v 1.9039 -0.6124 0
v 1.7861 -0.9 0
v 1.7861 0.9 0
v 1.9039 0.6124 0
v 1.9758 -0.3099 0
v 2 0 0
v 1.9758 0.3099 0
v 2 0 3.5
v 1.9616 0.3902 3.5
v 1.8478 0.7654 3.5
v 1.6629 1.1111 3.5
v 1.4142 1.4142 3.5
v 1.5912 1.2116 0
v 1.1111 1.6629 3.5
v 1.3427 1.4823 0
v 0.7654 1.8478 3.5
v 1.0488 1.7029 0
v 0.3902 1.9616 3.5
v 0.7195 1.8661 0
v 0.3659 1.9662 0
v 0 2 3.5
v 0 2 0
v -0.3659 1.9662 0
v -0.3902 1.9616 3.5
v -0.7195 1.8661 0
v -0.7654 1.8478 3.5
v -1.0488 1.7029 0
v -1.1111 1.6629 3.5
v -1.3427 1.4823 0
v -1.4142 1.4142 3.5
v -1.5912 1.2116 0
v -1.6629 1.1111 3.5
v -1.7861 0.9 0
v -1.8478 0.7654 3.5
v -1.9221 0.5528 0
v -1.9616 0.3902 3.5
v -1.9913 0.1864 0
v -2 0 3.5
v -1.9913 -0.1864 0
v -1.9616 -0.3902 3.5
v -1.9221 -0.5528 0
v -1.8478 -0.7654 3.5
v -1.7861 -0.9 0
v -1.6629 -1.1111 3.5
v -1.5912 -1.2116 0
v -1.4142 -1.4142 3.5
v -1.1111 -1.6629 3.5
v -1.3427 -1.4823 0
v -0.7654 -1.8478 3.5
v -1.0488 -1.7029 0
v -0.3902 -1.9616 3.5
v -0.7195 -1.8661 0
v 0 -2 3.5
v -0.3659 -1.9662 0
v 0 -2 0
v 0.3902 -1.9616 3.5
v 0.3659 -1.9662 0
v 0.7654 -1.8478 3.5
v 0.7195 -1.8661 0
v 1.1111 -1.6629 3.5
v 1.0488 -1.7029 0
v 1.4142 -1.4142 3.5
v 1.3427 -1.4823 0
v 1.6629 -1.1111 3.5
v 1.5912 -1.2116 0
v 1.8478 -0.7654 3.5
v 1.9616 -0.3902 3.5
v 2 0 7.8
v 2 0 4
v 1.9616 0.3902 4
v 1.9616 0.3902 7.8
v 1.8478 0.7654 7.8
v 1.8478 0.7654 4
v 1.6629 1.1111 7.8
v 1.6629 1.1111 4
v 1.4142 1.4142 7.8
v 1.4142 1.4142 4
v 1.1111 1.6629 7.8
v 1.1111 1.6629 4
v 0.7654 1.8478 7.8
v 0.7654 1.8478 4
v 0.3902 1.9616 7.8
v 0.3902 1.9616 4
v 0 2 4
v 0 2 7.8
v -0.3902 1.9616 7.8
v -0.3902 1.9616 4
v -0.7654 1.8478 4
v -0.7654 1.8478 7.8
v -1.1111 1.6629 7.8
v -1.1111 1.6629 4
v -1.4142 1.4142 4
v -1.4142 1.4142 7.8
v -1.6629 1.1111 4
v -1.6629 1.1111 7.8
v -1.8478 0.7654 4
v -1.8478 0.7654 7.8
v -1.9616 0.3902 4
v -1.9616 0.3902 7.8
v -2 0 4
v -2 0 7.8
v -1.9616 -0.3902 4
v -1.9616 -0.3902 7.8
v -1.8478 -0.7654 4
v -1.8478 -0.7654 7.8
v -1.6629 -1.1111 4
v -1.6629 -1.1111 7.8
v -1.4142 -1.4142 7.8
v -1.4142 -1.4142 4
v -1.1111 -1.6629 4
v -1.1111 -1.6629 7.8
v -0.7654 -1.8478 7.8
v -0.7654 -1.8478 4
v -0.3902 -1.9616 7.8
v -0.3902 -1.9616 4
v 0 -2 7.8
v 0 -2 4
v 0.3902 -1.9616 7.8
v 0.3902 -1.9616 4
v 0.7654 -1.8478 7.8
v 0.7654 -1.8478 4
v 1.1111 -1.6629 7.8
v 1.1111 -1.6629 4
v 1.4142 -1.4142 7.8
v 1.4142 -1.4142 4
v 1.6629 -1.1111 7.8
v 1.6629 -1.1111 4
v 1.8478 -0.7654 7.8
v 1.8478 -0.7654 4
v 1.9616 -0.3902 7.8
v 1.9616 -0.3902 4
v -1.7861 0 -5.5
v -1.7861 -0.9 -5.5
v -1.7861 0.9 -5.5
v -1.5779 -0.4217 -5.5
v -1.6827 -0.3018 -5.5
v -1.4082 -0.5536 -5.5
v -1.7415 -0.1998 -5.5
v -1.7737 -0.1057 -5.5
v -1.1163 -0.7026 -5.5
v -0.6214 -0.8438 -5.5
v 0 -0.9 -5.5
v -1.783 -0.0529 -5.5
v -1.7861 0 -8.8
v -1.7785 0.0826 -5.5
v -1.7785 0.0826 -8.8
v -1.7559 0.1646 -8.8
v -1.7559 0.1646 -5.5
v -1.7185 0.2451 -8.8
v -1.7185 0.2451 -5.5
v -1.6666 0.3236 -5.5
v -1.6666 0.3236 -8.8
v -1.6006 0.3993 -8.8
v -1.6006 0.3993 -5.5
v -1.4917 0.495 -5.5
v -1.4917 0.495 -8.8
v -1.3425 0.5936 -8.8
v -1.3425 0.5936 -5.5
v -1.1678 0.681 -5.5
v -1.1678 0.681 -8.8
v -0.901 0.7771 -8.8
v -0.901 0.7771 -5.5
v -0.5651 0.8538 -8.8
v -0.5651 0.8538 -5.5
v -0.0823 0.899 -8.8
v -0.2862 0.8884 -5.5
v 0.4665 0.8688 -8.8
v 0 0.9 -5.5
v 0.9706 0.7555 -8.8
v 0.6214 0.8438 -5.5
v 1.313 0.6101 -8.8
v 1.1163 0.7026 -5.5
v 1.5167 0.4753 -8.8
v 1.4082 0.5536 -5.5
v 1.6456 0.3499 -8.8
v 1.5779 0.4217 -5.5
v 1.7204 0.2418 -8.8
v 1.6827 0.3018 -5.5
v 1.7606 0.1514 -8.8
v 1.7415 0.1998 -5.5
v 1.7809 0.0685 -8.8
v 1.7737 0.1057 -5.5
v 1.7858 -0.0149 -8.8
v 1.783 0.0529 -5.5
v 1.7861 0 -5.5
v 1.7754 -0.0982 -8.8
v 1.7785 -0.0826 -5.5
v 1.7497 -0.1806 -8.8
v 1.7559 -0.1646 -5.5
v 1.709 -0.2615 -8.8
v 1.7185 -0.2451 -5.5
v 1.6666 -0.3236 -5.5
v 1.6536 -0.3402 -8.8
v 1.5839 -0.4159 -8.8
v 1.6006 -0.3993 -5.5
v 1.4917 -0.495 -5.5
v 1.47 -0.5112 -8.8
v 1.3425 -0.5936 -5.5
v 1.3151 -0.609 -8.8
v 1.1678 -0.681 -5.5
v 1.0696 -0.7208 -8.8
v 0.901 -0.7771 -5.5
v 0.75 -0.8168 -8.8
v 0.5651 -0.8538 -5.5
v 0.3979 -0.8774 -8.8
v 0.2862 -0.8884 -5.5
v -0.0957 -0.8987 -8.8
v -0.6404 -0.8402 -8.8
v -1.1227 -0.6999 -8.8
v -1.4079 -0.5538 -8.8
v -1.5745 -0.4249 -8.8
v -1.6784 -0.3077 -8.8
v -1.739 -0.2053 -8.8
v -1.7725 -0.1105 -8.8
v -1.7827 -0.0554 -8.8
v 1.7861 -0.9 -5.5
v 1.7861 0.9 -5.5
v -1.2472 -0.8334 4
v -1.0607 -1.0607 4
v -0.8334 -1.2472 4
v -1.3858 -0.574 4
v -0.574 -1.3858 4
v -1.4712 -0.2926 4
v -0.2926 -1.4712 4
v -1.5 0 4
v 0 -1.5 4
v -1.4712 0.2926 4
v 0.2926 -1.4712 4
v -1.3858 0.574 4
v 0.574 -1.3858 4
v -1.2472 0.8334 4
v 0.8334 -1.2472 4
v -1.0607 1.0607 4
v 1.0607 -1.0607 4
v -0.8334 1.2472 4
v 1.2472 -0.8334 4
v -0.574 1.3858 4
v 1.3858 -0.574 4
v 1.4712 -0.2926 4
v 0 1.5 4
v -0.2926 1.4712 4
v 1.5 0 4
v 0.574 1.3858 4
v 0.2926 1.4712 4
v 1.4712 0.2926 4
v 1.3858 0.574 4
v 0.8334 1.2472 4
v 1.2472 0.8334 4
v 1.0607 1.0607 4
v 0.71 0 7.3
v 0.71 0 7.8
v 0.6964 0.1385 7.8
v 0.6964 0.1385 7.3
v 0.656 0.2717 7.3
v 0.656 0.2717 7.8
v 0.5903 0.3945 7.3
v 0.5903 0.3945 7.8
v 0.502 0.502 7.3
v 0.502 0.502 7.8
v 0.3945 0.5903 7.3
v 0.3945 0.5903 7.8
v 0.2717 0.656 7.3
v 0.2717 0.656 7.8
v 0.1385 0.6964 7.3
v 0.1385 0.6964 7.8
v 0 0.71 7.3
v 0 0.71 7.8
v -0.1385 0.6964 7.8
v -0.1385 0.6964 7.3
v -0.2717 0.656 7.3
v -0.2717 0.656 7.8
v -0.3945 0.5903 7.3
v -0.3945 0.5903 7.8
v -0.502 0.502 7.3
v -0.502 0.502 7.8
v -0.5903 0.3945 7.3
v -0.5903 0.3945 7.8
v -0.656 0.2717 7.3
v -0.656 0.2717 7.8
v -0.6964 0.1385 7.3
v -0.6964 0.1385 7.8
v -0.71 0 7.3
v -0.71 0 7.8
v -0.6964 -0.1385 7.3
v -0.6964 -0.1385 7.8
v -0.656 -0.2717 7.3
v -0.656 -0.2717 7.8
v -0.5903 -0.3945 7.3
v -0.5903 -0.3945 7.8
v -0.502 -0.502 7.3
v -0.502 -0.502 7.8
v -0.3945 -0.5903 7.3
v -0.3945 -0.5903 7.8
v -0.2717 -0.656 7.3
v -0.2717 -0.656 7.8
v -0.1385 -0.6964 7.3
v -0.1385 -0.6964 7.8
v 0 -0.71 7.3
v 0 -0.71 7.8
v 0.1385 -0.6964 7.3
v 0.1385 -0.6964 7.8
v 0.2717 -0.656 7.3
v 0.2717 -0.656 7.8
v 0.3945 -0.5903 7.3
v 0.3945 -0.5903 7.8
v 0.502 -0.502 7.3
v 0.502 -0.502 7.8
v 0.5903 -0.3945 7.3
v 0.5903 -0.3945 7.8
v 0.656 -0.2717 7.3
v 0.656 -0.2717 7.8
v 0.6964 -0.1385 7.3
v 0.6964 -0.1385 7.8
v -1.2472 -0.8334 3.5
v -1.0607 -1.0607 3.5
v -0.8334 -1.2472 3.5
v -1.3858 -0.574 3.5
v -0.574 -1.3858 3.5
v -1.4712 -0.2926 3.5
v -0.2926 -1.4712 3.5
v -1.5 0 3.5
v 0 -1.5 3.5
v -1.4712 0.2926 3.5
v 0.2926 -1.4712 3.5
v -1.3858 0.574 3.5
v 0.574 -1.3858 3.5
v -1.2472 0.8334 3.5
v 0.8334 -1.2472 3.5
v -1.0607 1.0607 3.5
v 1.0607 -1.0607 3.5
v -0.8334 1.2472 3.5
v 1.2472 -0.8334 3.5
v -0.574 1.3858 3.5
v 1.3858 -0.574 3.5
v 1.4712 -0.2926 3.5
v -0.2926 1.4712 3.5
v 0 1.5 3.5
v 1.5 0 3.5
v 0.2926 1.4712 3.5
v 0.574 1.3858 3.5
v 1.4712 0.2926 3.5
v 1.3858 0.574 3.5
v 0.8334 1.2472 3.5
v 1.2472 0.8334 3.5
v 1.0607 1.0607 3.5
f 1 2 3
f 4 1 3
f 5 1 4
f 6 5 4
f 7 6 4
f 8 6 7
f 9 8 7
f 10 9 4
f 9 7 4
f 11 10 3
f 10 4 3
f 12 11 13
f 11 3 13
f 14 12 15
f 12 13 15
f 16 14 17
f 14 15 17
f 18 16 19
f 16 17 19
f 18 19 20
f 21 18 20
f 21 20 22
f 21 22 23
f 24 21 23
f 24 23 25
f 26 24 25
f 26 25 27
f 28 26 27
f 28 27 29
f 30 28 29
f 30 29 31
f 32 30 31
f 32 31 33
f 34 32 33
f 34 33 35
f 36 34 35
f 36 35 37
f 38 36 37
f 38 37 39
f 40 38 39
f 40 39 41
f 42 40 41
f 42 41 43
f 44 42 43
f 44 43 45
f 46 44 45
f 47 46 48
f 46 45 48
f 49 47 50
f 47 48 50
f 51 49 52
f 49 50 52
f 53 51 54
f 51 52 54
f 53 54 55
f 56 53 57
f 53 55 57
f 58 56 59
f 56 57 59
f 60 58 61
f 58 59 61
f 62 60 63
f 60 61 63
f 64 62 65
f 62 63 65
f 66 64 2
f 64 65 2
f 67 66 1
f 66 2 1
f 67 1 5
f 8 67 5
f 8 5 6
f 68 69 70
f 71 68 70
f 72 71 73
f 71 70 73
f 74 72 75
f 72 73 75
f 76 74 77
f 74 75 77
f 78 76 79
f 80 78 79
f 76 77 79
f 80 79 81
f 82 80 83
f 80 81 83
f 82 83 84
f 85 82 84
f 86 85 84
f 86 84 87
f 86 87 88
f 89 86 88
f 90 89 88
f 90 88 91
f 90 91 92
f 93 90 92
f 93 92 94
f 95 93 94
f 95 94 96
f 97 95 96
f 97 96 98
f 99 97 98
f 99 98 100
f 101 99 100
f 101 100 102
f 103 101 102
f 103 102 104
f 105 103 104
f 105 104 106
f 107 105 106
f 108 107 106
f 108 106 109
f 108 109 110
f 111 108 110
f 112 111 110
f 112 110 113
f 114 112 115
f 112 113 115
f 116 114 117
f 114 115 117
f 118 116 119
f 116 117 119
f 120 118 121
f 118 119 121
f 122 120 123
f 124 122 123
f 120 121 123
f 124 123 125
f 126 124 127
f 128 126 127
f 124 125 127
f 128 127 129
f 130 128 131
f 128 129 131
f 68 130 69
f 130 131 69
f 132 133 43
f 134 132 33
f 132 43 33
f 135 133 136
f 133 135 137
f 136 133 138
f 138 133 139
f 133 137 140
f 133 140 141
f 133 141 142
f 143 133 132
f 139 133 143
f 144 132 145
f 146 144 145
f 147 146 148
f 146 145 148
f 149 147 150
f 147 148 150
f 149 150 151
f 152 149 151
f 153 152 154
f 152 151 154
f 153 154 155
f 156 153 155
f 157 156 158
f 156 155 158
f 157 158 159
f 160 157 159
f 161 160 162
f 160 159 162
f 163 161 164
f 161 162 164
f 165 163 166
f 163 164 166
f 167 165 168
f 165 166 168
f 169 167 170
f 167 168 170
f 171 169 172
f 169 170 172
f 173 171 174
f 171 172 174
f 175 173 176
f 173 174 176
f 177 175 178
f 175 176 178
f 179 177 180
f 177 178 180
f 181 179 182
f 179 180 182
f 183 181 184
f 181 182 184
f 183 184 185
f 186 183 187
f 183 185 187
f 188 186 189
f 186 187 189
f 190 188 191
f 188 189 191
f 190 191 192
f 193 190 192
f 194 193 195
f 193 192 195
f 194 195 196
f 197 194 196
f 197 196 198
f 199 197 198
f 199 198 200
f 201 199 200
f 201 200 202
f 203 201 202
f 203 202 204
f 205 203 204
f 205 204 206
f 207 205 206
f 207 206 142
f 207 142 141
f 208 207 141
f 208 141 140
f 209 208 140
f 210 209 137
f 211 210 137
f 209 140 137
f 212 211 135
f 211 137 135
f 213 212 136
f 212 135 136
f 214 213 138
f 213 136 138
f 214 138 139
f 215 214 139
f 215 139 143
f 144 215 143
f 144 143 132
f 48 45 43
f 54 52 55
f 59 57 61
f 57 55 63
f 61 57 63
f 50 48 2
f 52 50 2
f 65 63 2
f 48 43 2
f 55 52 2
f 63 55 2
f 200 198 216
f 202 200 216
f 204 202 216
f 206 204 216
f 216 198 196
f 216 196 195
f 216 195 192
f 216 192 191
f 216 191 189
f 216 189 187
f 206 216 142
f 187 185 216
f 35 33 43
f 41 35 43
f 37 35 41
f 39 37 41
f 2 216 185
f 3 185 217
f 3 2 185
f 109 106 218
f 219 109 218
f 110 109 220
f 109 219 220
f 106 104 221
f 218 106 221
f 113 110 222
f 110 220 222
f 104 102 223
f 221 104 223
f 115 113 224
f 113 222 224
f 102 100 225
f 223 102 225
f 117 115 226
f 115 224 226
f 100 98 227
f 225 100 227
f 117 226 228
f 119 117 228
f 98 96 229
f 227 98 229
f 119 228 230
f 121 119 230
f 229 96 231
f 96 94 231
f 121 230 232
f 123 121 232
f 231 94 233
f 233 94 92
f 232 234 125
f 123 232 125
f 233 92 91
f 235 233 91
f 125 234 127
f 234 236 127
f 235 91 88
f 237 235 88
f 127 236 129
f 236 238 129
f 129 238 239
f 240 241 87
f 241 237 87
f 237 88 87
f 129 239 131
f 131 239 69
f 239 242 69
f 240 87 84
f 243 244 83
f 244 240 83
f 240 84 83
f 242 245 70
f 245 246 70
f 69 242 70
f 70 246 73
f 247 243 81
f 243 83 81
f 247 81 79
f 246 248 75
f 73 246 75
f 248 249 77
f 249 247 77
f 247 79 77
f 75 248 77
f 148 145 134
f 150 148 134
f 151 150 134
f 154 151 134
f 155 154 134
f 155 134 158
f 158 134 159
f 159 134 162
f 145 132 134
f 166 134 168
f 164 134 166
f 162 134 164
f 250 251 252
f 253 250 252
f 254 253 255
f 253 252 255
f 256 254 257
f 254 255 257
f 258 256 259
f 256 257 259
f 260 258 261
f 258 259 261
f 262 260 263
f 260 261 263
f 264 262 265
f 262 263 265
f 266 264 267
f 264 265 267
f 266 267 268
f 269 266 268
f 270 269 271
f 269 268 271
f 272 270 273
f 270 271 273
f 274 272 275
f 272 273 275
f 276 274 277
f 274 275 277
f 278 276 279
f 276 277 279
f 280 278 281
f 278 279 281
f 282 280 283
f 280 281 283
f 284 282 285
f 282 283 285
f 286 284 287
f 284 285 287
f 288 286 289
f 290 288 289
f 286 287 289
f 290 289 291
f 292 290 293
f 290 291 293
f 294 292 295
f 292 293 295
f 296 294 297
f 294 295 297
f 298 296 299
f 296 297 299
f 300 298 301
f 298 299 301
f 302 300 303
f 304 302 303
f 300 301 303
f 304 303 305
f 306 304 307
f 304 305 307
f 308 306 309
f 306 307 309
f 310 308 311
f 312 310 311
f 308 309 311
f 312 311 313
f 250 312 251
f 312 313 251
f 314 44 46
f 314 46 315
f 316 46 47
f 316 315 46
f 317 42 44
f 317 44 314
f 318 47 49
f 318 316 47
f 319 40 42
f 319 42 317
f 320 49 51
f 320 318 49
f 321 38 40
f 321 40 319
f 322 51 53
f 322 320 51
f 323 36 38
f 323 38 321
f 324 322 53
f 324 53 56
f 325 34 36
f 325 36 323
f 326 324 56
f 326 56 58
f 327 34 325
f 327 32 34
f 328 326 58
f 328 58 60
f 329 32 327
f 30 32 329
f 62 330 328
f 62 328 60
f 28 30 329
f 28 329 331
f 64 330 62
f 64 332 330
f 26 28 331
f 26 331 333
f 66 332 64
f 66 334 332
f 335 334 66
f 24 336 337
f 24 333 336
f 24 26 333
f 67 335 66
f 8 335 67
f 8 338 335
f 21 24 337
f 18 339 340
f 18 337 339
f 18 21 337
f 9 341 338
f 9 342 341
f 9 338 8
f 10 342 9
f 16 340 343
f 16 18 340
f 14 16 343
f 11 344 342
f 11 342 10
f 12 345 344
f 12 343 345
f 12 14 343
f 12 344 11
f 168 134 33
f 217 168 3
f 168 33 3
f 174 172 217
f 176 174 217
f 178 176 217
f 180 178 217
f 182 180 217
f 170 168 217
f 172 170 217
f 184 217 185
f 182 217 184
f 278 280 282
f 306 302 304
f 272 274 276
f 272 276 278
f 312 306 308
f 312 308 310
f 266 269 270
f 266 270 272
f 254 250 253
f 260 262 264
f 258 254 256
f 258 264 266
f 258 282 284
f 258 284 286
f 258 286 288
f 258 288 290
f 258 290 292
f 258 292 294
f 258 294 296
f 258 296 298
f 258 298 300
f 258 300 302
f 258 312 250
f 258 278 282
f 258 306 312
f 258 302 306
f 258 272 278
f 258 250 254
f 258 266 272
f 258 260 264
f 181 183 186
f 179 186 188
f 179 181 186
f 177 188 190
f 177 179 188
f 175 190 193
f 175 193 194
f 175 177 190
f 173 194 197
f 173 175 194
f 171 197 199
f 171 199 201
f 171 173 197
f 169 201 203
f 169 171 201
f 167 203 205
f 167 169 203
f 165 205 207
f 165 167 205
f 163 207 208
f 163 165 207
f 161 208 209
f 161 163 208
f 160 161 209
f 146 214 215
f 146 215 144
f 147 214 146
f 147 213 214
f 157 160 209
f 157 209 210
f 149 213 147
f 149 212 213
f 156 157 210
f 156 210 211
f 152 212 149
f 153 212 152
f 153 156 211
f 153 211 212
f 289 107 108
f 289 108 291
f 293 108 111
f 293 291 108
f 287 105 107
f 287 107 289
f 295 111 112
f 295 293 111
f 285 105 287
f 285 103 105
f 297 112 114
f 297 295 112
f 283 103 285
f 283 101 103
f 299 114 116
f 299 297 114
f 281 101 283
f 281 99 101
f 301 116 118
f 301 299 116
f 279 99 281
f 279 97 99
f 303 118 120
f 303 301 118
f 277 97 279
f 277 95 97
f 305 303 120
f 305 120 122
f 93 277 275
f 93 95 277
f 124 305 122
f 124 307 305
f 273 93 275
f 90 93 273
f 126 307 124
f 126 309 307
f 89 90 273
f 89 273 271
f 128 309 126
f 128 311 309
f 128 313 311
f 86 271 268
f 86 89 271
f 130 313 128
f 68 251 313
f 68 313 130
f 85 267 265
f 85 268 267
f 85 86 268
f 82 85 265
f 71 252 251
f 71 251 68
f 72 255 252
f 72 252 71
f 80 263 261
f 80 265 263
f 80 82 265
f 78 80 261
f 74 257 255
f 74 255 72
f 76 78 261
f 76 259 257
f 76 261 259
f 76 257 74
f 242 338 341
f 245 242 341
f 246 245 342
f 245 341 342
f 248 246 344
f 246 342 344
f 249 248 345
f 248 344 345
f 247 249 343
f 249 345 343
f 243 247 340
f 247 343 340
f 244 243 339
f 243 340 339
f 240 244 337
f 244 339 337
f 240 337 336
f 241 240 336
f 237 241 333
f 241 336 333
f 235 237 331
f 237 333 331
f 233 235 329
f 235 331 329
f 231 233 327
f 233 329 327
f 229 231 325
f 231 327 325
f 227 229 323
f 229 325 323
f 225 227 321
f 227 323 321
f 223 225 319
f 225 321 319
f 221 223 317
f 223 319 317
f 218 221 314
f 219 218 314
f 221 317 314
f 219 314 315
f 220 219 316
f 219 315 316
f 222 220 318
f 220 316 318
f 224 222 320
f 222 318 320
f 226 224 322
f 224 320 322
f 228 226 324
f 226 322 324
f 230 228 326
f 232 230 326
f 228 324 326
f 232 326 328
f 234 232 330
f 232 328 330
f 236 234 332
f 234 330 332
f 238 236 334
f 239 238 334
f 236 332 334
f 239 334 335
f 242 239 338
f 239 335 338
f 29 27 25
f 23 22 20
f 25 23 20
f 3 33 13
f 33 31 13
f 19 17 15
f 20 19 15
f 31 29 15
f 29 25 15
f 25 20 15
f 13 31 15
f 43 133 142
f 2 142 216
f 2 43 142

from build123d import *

# Parameters (mm, degrees)
SKETCH_1_R          = 2
EXTRUDE_1_DEPTH     = 7.8
CUT_EXTRUDE_START   = 3.5
SKETCH_2_R          = 2
SKETCH_2_R_2        = 1.5
CUT_EXTRUDE_1_DEPTH = 0.5
SKETCH_3_R          = 0.71
CUT_EXTRUDE_2_DEPTH = 0.5
SKETCH_4_W          = 3.57211422
SKETCH_4_H          = 1.8
EXTRUDE_2_DEPTH     = 5.5
SKETCH_5_RX         = 1.78605711
SKETCH_5_RY         = 0.9
EXTRUDE_3_DEPTH     = 3.3


with BuildPart() as part:
    # 草图1 → 凸台-拉伸1 (new body)
    with BuildSketch(Plane.XY):
        Circle(SKETCH_1_R)
    extrude(amount=EXTRUDE_1_DEPTH)

    # 草图2 → 切除-拉伸1 (cut)
    with BuildSketch(Plane.XY.offset(CUT_EXTRUDE_START)):
        Circle(SKETCH_2_R)
        Circle(SKETCH_2_R_2, mode=Mode.SUBTRACT)
    extrude(amount=CUT_EXTRUDE_1_DEPTH, mode=Mode.SUBTRACT)

    # 草图3 → 切除-拉伸2 (cut)
    with BuildSketch(Plane.XY.offset(7.8)):
        Circle(SKETCH_3_R)
    extrude(amount=-CUT_EXTRUDE_2_DEPTH, mode=Mode.SUBTRACT)

    # 草图4 → 凸台-拉伸2 (add)
    with BuildSketch(Plane.XY):
        Rectangle(SKETCH_4_W, SKETCH_4_H)
    extrude(amount=-EXTRUDE_2_DEPTH)

    # 草图5 → 凸台-拉伸3 (add)
    with BuildSketch(Plane(origin=(0, 0, -5.5), x_dir=(-1, 0, 0), z_dir=(0, 0, -1))):
        with Locations((0, 0)):
            Ellipse(SKETCH_5_RX, SKETCH_5_RY)
    extrude(amount=EXTRUDE_3_DEPTH)


solid = part.part
